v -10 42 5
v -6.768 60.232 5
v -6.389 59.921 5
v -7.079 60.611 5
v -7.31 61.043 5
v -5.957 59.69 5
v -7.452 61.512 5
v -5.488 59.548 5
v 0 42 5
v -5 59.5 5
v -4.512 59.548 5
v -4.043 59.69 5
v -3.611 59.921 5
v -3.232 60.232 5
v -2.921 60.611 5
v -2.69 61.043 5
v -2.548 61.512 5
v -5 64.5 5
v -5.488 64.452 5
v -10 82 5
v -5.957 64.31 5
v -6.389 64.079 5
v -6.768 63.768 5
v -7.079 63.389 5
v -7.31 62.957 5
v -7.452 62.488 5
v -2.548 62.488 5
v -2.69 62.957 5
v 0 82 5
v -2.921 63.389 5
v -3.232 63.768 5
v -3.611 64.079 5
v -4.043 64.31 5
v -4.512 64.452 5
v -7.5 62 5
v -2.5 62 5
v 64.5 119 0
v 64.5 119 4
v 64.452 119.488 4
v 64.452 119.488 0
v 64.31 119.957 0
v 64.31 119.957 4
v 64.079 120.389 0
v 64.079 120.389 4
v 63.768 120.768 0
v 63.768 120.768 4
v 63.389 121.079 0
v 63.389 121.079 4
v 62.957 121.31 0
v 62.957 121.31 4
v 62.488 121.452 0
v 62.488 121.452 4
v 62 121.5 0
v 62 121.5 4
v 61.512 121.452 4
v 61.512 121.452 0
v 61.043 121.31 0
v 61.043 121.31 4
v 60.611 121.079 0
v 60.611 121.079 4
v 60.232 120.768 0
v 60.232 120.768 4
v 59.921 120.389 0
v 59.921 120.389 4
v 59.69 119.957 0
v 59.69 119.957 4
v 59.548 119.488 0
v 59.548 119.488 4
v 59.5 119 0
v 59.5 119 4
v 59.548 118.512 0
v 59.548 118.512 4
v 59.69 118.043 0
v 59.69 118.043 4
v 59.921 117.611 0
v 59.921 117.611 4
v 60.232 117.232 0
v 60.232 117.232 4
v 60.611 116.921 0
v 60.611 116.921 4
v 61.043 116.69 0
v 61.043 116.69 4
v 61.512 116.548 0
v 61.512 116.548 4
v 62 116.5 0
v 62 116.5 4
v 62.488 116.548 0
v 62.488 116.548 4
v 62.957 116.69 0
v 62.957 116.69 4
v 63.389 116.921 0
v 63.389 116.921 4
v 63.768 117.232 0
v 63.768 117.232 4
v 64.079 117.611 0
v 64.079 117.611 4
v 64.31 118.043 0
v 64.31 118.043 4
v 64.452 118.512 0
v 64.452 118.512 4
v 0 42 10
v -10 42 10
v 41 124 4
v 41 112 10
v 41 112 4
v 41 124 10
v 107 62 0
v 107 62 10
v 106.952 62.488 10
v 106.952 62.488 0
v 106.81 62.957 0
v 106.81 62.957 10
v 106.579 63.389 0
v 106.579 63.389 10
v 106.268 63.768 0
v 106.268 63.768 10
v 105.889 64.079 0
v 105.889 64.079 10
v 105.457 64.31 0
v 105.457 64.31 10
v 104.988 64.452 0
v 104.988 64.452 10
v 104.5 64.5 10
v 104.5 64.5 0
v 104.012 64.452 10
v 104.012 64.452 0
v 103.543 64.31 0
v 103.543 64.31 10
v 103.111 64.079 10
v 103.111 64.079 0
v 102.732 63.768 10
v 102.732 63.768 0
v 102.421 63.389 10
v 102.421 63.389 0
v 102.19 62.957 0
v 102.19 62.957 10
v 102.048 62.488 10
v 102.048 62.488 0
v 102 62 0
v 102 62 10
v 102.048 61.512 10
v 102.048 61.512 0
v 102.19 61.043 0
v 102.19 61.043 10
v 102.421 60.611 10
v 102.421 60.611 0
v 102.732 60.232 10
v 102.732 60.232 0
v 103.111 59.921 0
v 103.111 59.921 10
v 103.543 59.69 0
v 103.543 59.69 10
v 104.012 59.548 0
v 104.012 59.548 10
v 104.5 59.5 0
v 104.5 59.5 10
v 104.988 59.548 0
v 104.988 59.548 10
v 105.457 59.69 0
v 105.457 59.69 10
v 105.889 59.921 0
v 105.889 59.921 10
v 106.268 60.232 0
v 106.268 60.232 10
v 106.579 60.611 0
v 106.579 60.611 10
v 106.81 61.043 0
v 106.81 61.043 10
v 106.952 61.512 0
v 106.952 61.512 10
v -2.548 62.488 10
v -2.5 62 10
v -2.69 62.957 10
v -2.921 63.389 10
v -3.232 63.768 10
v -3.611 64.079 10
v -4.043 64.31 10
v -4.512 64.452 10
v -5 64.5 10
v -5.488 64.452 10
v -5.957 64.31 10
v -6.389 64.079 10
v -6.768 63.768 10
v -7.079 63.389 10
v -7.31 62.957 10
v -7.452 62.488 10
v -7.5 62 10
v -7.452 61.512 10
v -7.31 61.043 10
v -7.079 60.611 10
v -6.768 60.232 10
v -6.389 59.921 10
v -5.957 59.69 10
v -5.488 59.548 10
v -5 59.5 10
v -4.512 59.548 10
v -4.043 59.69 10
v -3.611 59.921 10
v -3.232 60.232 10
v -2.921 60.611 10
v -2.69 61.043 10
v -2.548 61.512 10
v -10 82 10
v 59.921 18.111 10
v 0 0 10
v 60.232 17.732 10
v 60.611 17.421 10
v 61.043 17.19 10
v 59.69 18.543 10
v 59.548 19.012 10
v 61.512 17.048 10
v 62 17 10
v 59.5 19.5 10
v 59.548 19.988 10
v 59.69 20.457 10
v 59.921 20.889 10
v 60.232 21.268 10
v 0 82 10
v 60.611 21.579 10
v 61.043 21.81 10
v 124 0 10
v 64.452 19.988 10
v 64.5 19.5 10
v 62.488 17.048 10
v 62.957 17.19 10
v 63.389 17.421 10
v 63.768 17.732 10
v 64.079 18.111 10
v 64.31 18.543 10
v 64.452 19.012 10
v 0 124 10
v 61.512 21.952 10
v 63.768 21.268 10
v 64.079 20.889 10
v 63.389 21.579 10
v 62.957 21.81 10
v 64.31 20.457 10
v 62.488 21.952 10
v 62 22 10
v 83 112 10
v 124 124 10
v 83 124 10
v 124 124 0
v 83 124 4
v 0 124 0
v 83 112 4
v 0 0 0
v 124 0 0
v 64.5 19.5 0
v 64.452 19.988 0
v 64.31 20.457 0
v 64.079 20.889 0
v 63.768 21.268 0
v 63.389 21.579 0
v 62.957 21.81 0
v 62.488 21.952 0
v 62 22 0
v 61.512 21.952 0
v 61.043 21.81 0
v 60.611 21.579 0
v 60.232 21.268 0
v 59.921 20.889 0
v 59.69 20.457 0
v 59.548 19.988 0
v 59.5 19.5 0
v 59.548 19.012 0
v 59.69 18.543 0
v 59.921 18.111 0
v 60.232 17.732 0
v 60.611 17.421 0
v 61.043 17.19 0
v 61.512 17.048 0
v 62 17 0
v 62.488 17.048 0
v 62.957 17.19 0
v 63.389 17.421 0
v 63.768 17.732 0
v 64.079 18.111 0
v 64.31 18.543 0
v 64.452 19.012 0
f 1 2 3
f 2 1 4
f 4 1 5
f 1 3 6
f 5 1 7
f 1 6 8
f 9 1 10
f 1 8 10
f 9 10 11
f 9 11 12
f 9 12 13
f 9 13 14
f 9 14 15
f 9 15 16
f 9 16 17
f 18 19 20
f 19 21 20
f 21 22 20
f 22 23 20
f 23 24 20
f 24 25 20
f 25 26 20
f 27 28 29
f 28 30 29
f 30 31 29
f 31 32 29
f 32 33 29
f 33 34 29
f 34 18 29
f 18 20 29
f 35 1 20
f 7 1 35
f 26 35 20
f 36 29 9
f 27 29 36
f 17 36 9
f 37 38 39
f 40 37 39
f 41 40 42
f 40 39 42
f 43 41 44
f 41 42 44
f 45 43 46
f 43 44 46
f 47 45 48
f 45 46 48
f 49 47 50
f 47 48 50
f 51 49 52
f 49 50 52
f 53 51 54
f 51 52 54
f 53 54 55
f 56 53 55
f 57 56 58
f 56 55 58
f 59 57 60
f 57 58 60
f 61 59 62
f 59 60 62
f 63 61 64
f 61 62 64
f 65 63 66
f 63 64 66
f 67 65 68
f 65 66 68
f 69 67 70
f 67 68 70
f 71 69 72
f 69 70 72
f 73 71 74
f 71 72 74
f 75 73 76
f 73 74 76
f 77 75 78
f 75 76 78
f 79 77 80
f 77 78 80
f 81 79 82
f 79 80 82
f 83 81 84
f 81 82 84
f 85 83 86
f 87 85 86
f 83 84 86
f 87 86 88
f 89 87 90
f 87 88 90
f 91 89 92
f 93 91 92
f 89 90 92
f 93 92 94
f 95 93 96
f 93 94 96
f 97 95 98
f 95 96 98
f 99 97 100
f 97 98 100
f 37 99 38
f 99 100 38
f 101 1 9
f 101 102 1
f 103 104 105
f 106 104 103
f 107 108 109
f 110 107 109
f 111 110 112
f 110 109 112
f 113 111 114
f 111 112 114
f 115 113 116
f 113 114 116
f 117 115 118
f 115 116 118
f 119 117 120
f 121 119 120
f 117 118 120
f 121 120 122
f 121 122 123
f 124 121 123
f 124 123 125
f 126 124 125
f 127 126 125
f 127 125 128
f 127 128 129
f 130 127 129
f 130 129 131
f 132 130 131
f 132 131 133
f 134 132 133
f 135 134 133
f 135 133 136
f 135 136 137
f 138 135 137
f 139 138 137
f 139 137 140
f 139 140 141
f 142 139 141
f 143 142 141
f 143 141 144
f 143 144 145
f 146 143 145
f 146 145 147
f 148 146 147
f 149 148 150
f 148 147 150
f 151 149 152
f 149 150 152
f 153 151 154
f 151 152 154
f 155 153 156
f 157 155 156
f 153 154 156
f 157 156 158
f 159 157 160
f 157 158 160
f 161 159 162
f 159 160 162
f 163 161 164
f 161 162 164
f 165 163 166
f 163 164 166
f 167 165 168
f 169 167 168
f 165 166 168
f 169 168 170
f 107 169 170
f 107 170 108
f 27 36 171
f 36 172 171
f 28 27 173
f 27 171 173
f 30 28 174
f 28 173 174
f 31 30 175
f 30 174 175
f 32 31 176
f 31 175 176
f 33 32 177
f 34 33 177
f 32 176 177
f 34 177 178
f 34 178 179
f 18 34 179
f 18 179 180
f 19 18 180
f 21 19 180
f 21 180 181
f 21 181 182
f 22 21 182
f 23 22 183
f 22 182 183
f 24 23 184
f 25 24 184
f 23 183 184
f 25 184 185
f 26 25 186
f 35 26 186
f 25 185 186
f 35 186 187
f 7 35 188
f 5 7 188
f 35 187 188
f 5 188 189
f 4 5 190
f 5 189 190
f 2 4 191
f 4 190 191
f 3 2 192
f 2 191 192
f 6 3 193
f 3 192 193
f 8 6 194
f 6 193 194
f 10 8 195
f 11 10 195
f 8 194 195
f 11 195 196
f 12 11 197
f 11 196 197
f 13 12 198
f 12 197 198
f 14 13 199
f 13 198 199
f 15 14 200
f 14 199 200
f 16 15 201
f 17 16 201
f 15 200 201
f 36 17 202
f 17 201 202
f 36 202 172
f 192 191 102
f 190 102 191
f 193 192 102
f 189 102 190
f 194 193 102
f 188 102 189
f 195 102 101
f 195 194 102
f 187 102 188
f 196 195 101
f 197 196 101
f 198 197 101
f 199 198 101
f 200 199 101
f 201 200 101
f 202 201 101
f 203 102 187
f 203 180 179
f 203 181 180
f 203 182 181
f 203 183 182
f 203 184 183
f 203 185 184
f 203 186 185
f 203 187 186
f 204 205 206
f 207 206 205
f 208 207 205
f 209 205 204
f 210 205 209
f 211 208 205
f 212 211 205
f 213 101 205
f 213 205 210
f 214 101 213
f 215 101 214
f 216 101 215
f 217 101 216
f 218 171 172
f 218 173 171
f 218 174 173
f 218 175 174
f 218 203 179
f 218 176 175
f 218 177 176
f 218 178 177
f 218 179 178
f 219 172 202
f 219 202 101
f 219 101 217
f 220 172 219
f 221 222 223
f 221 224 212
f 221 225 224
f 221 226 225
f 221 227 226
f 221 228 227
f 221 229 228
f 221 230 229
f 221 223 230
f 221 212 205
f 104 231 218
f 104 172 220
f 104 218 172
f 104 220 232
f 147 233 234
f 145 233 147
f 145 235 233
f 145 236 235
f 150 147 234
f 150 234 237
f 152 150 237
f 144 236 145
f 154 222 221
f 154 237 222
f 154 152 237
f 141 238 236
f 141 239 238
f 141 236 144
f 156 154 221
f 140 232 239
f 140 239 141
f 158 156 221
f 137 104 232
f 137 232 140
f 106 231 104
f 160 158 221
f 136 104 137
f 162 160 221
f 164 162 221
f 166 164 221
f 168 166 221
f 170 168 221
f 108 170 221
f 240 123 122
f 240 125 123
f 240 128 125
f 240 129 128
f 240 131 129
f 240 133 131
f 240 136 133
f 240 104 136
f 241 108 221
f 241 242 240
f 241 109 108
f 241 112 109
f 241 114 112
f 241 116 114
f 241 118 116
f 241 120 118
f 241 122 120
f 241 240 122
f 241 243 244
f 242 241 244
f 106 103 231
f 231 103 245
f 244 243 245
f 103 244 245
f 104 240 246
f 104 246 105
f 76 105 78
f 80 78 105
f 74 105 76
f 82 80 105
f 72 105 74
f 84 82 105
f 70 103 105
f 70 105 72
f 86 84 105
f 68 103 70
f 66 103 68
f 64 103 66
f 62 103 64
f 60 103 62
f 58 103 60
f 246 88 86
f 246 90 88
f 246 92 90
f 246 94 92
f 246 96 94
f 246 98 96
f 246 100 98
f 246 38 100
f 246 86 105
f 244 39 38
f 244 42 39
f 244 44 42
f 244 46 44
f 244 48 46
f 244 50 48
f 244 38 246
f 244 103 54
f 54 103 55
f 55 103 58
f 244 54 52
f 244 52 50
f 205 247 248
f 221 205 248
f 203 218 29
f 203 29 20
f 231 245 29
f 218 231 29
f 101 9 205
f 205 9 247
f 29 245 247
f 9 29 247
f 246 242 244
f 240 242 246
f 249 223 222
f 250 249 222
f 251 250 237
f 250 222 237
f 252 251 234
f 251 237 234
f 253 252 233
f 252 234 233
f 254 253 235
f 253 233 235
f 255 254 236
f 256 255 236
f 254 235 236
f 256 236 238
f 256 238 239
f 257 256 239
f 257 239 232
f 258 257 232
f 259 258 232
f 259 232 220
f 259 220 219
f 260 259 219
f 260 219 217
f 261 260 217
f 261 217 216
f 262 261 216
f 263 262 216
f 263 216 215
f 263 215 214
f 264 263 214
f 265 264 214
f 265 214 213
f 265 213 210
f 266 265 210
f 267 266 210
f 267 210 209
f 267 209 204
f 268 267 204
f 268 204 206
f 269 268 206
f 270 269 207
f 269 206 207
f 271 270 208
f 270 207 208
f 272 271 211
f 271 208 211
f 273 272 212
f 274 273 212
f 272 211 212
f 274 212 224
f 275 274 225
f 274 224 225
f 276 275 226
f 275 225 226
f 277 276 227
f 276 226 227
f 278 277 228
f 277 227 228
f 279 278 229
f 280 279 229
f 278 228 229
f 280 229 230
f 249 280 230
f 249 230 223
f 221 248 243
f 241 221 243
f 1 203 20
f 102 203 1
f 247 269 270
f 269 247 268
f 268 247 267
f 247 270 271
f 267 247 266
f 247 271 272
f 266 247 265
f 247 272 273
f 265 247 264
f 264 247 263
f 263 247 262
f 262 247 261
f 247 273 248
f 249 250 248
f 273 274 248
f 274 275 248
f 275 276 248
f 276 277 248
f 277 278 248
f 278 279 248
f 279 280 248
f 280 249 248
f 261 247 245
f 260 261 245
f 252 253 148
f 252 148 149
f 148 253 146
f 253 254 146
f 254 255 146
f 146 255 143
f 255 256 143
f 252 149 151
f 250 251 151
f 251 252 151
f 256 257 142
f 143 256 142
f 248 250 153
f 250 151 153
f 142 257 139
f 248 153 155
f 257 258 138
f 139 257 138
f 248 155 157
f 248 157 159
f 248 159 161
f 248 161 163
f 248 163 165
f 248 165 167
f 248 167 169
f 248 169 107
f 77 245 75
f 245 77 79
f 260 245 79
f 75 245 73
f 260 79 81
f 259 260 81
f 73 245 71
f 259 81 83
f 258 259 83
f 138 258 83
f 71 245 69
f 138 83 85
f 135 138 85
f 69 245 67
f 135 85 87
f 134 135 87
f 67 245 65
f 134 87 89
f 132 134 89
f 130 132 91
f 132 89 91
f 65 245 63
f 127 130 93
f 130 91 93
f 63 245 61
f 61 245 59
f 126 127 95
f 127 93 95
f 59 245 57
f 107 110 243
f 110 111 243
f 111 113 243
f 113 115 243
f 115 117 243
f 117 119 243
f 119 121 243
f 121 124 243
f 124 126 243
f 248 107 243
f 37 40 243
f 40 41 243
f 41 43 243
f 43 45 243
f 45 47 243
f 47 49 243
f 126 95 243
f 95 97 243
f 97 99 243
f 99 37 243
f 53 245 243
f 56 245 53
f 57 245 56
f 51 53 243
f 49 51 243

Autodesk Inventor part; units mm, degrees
ref_plane "YZ Plane" through (0, 0, 0) normal (1, 0, 0) x (0, 1, 0)
ref_plane "XZ Plane" through (0, 0, 0) normal (0, 1, 0) x (-1, 0, 0)
ref_plane "XY Plane" through (0, 0, 0) normal (0, 0, 1) x (1, 0, 0)
sketch "Sketch1" plane through (0, 0, 0) normal (0, 0, 1) x (1, 0, 0)
  line L0 (0, 0) -> (124, 0)
  line L1 (124, 0) -> (124, 124)
  line L2 (124, 124) -> (0, 124)
  line L3 (0, 124) -> (0, 0)
  dimension "d0" = 124
  dimension "d1" = 124
extrude "Extrusion1" add sketch "Sketch1" along normal blind 10
sketch "Sketch2" plane through (0, 0, 10) normal (0, 0, 1) x (1, 0, 0)
  line L0 (124, 124) -> (0, 124) projected
  line L1 (41, 124) -> (83, 124)
  line L2 (83, 124) -> (83, 112)
  line L3 (83, 112) -> (41, 112)
  line L4 (41, 112) -> (41, 124)
  point P0 (0, 0)
  point P1 (62, 112)
  point P2 (62, 124)
  dimension "d4" = 42
  dimension "d5" = 12
extrude "Extrusion2" cut sketch "Sketch2" against normal blind 6
sketch "Sketch3" plane through (0, 0, 4) normal (0, 0, 1) x (1, 0, 0)
  circle A0 centre (62, 119) radius 2.5
  line L0 (41, 124) -> (83, 124) construction
  line L1 (41, 112) -> (41, 124) construction
  line L2 (83, 112) -> (41, 112) construction
  line L3 (83, 124) -> (83, 112) construction
  point P0 (0, 0)
  point P1 (62, 124)
  point P2 (83, 118)
  dimension "d8" = 5
  dimension "d22" = 5
extrude "Extrusion3" cut sketch "Sketch3" against normal through all
sketch "Sketch4" plane through (0, 0, 10) normal (0, 0, 1) x (1, 0, 0)
  line L0 (0, 124) -> (0, 0) projected
  line L1 (0, 82) -> (-10, 82)
  line L2 (-10, 82) -> (-10, 42)
  line L3 (-10, 42) -> (0, 42)
  line L4 (0, 42) -> (0, 82)
  circle A0 centre (-5, 62) radius 2.5
  point P0 (-10, 62)
  point P1 (0, 62)
  point P2 (-5, 82)
  dimension "d11" = 10
  dimension "d12" = 40
  dimension "d13" = 5
extrude "Extrusion4" add sketch "Sketch4" against normal blind 5
sketch "Sketch5" plane through (0, 0, 10) normal (0, 0, 1) x (1, 0, 0)
  circle A0 centre (62, 19.5) radius 2.5
  line L0 (0, 0) -> (124, 0) projected
  circle A1 centre (104.5, 62) radius 2.5
  line L1 (124, 0) -> (124, 124) projected
  point P0 (62, 0)
  point P1 (124, 62)
  dimension "d16" = 5
  dimension "d17" = 19.5
  dimension "d18" = 5
  dimension "d19" = 19.5
extrude "Extrusion5" cut sketch "Sketch5" against normal through all
properties part number "TC001" material "ABS Plastic"
